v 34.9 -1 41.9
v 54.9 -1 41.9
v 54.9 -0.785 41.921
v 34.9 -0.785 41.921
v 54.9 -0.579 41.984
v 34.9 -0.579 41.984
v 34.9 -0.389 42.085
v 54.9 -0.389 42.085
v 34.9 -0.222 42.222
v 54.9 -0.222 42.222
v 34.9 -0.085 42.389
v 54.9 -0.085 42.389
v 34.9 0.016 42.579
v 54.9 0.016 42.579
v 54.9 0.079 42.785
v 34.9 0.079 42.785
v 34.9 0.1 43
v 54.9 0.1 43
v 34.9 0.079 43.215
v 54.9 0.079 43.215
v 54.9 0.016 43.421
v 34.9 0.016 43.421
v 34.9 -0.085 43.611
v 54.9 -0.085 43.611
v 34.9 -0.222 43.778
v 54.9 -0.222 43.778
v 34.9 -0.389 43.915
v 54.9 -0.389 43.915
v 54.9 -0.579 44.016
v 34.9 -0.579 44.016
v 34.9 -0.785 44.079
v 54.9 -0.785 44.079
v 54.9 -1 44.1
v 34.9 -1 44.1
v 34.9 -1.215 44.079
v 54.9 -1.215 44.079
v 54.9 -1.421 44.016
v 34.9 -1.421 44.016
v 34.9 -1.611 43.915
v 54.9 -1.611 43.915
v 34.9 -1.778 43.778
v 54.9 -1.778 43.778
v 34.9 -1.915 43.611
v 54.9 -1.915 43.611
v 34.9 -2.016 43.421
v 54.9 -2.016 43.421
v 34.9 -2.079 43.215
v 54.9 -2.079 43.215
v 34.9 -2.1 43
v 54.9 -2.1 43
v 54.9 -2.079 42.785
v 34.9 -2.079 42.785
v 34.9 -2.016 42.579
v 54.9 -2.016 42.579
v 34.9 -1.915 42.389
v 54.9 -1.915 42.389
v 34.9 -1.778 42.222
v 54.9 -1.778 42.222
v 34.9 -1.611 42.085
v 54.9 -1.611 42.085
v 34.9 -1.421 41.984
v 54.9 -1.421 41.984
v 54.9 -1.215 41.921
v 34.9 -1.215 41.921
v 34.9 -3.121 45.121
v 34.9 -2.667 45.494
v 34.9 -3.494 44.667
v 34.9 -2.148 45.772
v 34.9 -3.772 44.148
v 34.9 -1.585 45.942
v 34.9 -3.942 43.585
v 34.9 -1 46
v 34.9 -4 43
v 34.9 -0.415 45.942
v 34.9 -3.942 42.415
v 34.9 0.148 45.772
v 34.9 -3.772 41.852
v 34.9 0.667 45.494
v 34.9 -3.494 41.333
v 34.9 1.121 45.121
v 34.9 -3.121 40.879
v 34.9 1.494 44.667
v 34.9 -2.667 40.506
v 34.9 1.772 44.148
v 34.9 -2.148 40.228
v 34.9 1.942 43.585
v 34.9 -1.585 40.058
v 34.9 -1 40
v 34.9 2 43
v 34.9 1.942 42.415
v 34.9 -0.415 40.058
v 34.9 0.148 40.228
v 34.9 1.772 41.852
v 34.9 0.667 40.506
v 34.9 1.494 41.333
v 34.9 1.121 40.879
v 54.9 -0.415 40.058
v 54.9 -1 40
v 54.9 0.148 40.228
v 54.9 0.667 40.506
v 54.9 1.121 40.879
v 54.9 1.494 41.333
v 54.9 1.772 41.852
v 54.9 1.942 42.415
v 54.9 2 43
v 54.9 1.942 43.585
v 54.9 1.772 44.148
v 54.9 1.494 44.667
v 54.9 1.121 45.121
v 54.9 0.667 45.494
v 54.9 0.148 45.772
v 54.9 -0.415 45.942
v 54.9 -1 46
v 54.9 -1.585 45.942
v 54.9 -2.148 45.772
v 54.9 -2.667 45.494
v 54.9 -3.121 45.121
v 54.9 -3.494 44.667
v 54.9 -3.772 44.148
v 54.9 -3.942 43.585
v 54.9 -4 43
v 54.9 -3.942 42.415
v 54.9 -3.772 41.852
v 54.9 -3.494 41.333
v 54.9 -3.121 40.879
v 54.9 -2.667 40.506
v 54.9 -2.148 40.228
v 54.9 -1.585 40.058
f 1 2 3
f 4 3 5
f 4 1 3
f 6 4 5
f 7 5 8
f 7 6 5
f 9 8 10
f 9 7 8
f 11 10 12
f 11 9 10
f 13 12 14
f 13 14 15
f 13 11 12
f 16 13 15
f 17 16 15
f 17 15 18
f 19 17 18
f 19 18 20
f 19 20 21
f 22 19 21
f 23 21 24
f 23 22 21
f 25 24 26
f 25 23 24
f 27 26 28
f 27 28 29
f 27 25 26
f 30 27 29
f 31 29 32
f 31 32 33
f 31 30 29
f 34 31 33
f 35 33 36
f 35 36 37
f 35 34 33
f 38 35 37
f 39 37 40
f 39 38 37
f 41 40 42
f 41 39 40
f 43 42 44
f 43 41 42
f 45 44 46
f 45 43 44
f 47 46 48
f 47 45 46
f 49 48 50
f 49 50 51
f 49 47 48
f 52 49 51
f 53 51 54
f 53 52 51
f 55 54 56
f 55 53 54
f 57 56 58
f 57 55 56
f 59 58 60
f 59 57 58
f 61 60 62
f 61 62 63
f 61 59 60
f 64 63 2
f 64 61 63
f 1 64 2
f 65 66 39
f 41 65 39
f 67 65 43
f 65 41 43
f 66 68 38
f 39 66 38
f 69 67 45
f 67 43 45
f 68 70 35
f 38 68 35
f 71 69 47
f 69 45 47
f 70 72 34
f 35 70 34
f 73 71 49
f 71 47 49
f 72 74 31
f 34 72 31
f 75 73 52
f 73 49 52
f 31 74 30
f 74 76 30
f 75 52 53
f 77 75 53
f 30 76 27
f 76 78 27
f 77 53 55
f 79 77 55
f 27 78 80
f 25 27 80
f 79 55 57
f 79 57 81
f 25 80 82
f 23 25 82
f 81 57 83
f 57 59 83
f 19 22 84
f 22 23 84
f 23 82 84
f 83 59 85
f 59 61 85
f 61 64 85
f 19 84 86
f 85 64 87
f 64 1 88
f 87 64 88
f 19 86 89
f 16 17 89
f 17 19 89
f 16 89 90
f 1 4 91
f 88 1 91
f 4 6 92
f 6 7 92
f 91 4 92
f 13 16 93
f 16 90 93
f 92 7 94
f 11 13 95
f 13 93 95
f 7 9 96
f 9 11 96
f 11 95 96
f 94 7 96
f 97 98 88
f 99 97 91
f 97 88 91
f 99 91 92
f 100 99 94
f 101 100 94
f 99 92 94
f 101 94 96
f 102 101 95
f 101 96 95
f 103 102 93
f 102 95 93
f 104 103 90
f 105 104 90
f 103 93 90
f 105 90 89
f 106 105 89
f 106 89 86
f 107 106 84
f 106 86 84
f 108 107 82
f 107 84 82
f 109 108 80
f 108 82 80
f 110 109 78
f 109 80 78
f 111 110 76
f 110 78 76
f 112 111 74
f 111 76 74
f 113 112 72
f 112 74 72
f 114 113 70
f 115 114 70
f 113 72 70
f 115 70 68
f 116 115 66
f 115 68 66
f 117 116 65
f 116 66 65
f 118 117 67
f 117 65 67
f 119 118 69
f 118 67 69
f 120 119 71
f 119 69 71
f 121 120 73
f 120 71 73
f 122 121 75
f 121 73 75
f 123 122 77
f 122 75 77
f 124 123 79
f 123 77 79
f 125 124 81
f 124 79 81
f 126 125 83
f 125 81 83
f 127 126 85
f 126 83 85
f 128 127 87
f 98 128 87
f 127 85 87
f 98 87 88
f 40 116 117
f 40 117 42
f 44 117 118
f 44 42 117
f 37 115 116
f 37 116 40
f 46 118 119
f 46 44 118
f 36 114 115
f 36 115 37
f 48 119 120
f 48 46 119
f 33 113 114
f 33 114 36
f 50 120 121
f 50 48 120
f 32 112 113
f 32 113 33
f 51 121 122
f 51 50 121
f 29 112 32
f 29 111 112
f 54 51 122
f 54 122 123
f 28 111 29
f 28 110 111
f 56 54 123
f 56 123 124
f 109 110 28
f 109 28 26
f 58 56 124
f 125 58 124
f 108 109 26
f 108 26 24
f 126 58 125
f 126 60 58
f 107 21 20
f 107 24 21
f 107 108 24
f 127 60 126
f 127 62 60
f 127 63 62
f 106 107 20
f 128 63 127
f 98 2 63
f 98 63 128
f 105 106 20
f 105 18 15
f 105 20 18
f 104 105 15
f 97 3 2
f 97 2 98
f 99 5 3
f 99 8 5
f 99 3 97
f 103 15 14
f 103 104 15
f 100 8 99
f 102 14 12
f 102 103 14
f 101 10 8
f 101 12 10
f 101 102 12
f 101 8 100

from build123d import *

# Parameters (mm, degrees)
HINGE_CYLLI_R     = 1.1
HINGE_CYLLI_DEPTH = 20
HINGE_CYLLO_R     = 3
HINGE_CYLLO_DEPTH = 20


with BuildPart() as hinge_cylli:
    # hinge_cylli → hinge_cylli (new body)
    with BuildSketch(Plane(origin=(34.9, -1, 43), x_dir=(0, 0, -1), z_dir=(1, 0, 0))):
        Circle(HINGE_CYLLI_R)
    extrude(amount=HINGE_CYLLI_DEPTH)


with BuildPart() as hinge_left:
    # hinge_cyllo → hinge_cyllo (new body)
    with BuildSketch(Plane(origin=(34.9, -1, 43), x_dir=(0, 0, -1), z_dir=(1, 0, 0))):
        Circle(HINGE_CYLLO_R)
    extrude(amount=HINGE_CYLLO_DEPTH)

    # hinge_left: cut hinge_cylli
    add(hinge_cylli.part, mode=Mode.SUBTRACT)


solid = hinge_left.part
